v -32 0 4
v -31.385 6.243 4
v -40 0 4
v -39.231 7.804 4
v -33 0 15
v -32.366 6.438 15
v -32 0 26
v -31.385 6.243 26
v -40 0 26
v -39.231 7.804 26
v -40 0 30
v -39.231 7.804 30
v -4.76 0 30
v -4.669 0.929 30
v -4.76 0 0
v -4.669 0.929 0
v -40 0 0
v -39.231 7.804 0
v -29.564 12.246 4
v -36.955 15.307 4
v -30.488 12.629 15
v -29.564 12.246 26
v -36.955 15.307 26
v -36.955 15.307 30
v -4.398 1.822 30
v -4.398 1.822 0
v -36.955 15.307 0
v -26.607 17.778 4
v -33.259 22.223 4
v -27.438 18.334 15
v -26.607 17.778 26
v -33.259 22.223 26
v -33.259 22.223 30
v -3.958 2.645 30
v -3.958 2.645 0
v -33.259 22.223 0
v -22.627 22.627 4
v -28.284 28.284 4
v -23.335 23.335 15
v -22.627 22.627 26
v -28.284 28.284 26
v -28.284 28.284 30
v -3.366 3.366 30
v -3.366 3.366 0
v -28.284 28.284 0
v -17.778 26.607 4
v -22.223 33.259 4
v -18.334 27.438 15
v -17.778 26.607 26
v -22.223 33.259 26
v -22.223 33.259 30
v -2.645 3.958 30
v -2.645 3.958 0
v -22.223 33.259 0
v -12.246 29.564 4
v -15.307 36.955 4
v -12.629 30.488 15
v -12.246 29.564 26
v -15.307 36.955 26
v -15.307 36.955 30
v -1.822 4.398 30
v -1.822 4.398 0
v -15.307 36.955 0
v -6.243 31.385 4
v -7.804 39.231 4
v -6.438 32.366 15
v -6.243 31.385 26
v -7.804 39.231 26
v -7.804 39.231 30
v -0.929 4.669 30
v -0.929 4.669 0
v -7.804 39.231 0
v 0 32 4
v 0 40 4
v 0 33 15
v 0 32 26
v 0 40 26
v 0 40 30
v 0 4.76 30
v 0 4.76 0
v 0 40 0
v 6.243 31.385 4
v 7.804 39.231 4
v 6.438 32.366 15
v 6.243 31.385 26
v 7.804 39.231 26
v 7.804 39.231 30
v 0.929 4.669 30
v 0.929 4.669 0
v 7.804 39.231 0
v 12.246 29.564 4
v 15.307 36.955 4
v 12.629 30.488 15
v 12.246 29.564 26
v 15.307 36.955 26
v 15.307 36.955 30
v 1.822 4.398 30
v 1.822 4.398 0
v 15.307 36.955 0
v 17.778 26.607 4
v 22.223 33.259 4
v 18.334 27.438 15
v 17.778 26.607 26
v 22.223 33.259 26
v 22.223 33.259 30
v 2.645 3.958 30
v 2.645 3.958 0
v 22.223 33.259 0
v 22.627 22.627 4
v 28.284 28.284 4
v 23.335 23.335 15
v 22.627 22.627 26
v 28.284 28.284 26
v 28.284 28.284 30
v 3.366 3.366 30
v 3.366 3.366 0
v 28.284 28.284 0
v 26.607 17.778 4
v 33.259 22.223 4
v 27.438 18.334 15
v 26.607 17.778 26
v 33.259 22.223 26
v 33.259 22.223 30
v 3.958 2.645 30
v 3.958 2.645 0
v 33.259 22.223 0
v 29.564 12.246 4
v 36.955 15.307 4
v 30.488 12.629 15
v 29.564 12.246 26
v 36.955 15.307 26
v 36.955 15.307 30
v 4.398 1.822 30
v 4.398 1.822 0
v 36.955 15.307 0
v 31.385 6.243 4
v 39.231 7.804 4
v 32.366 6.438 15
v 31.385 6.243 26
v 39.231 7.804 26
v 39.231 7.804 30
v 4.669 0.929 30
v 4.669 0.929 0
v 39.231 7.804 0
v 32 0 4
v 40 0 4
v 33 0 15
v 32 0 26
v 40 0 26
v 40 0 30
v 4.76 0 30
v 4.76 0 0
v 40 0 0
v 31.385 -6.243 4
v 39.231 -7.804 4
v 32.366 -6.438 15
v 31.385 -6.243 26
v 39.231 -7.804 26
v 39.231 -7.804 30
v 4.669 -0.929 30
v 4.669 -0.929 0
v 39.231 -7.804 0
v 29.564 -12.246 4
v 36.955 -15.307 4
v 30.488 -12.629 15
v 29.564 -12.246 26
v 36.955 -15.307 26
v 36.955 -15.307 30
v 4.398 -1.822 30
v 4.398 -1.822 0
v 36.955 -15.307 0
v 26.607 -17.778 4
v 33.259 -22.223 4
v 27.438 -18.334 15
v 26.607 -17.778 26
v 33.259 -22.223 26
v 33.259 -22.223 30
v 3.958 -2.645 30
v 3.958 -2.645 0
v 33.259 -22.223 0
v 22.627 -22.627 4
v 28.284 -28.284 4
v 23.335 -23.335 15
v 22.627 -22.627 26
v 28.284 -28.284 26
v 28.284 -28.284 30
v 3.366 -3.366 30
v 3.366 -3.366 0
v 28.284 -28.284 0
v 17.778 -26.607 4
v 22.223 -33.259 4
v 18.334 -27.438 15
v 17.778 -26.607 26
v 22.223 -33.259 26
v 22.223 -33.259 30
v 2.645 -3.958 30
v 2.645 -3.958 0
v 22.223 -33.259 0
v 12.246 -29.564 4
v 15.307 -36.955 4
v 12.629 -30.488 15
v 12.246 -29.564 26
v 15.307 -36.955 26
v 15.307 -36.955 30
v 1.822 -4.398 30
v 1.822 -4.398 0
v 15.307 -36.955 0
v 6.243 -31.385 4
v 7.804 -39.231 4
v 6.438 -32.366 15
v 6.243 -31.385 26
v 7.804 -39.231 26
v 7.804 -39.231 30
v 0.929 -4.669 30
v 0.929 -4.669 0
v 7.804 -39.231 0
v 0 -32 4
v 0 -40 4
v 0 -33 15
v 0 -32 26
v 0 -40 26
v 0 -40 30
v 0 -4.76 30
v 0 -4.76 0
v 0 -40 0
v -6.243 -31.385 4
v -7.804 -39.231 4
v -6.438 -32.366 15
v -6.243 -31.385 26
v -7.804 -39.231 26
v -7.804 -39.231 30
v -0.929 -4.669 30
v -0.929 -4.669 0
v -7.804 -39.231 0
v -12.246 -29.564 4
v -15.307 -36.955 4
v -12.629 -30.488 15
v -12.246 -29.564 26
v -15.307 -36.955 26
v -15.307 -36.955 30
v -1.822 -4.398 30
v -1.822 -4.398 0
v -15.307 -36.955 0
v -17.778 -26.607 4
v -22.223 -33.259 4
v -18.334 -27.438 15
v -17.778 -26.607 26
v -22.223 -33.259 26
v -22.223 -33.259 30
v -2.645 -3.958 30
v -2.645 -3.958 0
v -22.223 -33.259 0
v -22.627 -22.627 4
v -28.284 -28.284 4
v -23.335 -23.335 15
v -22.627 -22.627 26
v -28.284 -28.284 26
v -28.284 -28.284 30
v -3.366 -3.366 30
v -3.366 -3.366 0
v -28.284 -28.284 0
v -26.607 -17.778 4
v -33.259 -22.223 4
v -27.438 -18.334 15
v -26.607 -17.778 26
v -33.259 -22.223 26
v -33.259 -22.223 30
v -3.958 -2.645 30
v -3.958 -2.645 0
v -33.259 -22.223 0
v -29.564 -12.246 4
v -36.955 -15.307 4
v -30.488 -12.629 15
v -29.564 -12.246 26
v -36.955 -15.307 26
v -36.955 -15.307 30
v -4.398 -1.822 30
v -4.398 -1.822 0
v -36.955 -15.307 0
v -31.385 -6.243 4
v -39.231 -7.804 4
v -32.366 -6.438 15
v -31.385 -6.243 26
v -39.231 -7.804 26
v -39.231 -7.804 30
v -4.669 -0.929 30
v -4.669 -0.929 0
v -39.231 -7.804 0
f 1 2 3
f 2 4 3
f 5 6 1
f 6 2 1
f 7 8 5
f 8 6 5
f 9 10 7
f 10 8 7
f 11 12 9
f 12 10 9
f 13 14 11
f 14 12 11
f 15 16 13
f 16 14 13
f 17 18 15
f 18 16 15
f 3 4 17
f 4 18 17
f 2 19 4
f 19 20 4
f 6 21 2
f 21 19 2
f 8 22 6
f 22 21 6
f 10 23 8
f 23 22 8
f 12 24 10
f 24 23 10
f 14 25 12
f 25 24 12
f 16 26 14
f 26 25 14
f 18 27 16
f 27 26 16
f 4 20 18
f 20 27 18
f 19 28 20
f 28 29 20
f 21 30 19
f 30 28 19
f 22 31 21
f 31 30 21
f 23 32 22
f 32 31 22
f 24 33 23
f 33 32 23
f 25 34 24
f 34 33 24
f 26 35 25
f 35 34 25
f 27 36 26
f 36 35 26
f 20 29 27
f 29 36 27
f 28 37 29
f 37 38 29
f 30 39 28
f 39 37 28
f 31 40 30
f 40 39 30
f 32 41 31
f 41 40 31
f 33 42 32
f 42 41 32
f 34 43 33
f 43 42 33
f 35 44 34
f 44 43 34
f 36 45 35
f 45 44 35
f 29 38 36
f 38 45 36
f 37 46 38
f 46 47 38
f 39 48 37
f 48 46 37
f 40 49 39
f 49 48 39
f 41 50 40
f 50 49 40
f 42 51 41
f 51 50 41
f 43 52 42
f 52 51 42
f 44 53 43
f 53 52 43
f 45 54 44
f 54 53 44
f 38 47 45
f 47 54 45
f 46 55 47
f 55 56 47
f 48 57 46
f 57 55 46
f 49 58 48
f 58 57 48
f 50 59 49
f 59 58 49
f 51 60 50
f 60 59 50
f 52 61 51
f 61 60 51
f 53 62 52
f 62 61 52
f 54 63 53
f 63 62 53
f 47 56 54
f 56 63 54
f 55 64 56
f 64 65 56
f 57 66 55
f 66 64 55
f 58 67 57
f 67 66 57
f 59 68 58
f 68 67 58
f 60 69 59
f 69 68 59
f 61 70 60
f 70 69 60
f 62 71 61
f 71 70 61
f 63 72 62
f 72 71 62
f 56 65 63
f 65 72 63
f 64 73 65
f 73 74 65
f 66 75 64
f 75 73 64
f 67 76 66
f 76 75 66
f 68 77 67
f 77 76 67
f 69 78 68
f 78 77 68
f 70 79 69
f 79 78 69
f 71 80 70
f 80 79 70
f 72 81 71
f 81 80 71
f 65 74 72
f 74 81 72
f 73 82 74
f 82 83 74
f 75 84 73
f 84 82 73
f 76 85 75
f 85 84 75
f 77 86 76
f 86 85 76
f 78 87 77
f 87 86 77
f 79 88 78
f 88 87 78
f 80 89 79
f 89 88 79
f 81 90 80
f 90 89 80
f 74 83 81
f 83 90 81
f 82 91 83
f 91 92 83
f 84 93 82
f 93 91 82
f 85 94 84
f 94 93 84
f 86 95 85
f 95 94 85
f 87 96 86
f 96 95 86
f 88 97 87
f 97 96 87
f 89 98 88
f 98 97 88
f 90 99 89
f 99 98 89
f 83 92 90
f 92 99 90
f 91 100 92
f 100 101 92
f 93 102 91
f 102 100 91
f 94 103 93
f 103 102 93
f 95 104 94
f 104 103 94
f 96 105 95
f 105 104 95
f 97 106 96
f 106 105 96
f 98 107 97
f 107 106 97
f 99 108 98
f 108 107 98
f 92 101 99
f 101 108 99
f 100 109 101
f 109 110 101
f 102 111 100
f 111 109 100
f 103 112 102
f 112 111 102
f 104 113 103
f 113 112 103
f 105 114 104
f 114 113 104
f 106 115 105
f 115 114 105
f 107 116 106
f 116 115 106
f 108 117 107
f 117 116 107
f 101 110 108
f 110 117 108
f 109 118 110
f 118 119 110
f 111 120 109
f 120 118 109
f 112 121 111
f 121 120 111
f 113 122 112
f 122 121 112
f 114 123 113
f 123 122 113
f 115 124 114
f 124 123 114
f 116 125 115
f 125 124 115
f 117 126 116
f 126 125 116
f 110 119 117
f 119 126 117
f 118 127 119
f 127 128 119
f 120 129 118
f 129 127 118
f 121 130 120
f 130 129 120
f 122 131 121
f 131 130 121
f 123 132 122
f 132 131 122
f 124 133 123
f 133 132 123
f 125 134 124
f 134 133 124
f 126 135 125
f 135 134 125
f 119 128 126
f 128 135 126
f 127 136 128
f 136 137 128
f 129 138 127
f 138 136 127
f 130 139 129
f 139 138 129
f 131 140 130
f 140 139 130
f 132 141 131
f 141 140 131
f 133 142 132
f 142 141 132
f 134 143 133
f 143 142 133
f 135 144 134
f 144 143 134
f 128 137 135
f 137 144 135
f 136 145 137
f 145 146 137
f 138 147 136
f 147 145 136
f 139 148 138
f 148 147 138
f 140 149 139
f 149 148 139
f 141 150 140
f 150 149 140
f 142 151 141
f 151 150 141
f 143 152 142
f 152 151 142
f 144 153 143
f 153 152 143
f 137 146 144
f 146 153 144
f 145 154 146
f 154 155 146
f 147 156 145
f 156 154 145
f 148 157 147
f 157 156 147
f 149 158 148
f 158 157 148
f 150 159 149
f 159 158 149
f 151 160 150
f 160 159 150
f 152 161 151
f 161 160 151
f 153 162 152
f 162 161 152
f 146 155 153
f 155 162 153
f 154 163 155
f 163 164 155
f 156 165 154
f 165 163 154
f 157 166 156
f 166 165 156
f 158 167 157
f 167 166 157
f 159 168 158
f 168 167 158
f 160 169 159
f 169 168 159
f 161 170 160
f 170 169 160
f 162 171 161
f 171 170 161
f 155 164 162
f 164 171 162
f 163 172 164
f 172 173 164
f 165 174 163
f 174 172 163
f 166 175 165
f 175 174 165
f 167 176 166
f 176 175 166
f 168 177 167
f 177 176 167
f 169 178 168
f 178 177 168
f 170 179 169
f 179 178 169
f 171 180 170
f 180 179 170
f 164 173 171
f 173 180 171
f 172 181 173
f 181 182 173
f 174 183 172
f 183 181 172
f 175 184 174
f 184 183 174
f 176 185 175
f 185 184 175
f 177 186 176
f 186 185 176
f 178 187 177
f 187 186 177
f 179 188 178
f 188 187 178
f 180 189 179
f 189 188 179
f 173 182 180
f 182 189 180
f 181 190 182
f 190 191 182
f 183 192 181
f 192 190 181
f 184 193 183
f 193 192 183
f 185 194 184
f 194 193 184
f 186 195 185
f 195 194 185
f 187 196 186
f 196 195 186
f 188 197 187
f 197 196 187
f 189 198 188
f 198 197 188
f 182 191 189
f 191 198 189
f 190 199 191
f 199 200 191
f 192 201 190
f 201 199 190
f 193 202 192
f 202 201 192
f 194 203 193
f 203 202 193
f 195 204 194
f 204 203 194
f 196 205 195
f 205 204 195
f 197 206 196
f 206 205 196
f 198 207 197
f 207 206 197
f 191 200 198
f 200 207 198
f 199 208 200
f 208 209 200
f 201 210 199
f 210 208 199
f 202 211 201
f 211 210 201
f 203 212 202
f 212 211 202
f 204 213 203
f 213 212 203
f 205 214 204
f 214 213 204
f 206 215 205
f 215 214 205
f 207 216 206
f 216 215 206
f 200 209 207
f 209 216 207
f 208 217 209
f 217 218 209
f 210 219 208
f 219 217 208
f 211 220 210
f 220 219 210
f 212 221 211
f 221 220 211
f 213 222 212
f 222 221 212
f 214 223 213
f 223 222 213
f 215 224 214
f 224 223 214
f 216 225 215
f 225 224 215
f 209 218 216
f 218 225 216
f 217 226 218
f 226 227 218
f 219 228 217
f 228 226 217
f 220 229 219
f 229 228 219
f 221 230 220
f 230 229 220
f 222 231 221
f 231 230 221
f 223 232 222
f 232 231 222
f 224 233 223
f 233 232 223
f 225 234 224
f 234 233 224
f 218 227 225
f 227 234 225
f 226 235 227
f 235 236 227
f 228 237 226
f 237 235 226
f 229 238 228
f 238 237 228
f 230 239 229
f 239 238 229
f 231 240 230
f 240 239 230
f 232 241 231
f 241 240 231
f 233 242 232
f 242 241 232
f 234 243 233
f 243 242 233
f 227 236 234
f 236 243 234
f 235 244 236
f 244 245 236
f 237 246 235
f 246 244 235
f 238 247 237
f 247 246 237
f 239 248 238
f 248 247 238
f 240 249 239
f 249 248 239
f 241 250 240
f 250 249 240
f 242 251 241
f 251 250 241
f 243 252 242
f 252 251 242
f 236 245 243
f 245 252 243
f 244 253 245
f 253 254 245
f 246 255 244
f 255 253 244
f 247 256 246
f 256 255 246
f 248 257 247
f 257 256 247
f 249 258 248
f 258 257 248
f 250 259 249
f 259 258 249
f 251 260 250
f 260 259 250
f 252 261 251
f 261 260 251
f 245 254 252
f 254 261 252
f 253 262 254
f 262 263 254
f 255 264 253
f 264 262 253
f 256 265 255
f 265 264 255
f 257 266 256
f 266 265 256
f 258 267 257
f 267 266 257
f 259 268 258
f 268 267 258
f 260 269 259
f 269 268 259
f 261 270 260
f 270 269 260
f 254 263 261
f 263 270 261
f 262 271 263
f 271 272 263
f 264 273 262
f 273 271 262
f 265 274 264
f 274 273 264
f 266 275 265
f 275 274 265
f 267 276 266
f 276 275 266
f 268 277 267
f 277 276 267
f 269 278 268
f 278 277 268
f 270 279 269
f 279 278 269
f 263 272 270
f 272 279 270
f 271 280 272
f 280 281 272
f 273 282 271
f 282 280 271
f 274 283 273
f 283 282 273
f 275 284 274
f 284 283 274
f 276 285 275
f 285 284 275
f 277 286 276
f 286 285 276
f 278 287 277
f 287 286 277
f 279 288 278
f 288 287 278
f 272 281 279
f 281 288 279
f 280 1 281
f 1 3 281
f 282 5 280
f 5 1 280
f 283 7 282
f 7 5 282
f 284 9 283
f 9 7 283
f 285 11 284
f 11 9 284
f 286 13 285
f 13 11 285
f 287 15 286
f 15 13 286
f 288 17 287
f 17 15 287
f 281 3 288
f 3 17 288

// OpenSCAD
$fn = 32;

// ----------------------------------------------------------------------
// Belt roller: 64 mm barrel, 30 mm wide, bore 9.52 mm
// ----------------------------------------------------------------------

// --- parameters (mm) ---
bore_d = 9.52;            // bore
barrel_d = 64;            // barrel diameter
roller_w = 30;            // roller width
flange_d = 80;            // flange diameter
flange_t = 4;             // flange thickness
hub_d = 29.52;            // hub diameter

roller_profile = [[4.76, 0], [40, 0], [40, 4], [32, 4], [33, 15], [32, 26], [40, 26], [40, 30], [4.76, 30]];

/* the profile stays clear of the axis, so the bore comes out of the revolve */
rotate_extrude() polygon(roller_profile);
